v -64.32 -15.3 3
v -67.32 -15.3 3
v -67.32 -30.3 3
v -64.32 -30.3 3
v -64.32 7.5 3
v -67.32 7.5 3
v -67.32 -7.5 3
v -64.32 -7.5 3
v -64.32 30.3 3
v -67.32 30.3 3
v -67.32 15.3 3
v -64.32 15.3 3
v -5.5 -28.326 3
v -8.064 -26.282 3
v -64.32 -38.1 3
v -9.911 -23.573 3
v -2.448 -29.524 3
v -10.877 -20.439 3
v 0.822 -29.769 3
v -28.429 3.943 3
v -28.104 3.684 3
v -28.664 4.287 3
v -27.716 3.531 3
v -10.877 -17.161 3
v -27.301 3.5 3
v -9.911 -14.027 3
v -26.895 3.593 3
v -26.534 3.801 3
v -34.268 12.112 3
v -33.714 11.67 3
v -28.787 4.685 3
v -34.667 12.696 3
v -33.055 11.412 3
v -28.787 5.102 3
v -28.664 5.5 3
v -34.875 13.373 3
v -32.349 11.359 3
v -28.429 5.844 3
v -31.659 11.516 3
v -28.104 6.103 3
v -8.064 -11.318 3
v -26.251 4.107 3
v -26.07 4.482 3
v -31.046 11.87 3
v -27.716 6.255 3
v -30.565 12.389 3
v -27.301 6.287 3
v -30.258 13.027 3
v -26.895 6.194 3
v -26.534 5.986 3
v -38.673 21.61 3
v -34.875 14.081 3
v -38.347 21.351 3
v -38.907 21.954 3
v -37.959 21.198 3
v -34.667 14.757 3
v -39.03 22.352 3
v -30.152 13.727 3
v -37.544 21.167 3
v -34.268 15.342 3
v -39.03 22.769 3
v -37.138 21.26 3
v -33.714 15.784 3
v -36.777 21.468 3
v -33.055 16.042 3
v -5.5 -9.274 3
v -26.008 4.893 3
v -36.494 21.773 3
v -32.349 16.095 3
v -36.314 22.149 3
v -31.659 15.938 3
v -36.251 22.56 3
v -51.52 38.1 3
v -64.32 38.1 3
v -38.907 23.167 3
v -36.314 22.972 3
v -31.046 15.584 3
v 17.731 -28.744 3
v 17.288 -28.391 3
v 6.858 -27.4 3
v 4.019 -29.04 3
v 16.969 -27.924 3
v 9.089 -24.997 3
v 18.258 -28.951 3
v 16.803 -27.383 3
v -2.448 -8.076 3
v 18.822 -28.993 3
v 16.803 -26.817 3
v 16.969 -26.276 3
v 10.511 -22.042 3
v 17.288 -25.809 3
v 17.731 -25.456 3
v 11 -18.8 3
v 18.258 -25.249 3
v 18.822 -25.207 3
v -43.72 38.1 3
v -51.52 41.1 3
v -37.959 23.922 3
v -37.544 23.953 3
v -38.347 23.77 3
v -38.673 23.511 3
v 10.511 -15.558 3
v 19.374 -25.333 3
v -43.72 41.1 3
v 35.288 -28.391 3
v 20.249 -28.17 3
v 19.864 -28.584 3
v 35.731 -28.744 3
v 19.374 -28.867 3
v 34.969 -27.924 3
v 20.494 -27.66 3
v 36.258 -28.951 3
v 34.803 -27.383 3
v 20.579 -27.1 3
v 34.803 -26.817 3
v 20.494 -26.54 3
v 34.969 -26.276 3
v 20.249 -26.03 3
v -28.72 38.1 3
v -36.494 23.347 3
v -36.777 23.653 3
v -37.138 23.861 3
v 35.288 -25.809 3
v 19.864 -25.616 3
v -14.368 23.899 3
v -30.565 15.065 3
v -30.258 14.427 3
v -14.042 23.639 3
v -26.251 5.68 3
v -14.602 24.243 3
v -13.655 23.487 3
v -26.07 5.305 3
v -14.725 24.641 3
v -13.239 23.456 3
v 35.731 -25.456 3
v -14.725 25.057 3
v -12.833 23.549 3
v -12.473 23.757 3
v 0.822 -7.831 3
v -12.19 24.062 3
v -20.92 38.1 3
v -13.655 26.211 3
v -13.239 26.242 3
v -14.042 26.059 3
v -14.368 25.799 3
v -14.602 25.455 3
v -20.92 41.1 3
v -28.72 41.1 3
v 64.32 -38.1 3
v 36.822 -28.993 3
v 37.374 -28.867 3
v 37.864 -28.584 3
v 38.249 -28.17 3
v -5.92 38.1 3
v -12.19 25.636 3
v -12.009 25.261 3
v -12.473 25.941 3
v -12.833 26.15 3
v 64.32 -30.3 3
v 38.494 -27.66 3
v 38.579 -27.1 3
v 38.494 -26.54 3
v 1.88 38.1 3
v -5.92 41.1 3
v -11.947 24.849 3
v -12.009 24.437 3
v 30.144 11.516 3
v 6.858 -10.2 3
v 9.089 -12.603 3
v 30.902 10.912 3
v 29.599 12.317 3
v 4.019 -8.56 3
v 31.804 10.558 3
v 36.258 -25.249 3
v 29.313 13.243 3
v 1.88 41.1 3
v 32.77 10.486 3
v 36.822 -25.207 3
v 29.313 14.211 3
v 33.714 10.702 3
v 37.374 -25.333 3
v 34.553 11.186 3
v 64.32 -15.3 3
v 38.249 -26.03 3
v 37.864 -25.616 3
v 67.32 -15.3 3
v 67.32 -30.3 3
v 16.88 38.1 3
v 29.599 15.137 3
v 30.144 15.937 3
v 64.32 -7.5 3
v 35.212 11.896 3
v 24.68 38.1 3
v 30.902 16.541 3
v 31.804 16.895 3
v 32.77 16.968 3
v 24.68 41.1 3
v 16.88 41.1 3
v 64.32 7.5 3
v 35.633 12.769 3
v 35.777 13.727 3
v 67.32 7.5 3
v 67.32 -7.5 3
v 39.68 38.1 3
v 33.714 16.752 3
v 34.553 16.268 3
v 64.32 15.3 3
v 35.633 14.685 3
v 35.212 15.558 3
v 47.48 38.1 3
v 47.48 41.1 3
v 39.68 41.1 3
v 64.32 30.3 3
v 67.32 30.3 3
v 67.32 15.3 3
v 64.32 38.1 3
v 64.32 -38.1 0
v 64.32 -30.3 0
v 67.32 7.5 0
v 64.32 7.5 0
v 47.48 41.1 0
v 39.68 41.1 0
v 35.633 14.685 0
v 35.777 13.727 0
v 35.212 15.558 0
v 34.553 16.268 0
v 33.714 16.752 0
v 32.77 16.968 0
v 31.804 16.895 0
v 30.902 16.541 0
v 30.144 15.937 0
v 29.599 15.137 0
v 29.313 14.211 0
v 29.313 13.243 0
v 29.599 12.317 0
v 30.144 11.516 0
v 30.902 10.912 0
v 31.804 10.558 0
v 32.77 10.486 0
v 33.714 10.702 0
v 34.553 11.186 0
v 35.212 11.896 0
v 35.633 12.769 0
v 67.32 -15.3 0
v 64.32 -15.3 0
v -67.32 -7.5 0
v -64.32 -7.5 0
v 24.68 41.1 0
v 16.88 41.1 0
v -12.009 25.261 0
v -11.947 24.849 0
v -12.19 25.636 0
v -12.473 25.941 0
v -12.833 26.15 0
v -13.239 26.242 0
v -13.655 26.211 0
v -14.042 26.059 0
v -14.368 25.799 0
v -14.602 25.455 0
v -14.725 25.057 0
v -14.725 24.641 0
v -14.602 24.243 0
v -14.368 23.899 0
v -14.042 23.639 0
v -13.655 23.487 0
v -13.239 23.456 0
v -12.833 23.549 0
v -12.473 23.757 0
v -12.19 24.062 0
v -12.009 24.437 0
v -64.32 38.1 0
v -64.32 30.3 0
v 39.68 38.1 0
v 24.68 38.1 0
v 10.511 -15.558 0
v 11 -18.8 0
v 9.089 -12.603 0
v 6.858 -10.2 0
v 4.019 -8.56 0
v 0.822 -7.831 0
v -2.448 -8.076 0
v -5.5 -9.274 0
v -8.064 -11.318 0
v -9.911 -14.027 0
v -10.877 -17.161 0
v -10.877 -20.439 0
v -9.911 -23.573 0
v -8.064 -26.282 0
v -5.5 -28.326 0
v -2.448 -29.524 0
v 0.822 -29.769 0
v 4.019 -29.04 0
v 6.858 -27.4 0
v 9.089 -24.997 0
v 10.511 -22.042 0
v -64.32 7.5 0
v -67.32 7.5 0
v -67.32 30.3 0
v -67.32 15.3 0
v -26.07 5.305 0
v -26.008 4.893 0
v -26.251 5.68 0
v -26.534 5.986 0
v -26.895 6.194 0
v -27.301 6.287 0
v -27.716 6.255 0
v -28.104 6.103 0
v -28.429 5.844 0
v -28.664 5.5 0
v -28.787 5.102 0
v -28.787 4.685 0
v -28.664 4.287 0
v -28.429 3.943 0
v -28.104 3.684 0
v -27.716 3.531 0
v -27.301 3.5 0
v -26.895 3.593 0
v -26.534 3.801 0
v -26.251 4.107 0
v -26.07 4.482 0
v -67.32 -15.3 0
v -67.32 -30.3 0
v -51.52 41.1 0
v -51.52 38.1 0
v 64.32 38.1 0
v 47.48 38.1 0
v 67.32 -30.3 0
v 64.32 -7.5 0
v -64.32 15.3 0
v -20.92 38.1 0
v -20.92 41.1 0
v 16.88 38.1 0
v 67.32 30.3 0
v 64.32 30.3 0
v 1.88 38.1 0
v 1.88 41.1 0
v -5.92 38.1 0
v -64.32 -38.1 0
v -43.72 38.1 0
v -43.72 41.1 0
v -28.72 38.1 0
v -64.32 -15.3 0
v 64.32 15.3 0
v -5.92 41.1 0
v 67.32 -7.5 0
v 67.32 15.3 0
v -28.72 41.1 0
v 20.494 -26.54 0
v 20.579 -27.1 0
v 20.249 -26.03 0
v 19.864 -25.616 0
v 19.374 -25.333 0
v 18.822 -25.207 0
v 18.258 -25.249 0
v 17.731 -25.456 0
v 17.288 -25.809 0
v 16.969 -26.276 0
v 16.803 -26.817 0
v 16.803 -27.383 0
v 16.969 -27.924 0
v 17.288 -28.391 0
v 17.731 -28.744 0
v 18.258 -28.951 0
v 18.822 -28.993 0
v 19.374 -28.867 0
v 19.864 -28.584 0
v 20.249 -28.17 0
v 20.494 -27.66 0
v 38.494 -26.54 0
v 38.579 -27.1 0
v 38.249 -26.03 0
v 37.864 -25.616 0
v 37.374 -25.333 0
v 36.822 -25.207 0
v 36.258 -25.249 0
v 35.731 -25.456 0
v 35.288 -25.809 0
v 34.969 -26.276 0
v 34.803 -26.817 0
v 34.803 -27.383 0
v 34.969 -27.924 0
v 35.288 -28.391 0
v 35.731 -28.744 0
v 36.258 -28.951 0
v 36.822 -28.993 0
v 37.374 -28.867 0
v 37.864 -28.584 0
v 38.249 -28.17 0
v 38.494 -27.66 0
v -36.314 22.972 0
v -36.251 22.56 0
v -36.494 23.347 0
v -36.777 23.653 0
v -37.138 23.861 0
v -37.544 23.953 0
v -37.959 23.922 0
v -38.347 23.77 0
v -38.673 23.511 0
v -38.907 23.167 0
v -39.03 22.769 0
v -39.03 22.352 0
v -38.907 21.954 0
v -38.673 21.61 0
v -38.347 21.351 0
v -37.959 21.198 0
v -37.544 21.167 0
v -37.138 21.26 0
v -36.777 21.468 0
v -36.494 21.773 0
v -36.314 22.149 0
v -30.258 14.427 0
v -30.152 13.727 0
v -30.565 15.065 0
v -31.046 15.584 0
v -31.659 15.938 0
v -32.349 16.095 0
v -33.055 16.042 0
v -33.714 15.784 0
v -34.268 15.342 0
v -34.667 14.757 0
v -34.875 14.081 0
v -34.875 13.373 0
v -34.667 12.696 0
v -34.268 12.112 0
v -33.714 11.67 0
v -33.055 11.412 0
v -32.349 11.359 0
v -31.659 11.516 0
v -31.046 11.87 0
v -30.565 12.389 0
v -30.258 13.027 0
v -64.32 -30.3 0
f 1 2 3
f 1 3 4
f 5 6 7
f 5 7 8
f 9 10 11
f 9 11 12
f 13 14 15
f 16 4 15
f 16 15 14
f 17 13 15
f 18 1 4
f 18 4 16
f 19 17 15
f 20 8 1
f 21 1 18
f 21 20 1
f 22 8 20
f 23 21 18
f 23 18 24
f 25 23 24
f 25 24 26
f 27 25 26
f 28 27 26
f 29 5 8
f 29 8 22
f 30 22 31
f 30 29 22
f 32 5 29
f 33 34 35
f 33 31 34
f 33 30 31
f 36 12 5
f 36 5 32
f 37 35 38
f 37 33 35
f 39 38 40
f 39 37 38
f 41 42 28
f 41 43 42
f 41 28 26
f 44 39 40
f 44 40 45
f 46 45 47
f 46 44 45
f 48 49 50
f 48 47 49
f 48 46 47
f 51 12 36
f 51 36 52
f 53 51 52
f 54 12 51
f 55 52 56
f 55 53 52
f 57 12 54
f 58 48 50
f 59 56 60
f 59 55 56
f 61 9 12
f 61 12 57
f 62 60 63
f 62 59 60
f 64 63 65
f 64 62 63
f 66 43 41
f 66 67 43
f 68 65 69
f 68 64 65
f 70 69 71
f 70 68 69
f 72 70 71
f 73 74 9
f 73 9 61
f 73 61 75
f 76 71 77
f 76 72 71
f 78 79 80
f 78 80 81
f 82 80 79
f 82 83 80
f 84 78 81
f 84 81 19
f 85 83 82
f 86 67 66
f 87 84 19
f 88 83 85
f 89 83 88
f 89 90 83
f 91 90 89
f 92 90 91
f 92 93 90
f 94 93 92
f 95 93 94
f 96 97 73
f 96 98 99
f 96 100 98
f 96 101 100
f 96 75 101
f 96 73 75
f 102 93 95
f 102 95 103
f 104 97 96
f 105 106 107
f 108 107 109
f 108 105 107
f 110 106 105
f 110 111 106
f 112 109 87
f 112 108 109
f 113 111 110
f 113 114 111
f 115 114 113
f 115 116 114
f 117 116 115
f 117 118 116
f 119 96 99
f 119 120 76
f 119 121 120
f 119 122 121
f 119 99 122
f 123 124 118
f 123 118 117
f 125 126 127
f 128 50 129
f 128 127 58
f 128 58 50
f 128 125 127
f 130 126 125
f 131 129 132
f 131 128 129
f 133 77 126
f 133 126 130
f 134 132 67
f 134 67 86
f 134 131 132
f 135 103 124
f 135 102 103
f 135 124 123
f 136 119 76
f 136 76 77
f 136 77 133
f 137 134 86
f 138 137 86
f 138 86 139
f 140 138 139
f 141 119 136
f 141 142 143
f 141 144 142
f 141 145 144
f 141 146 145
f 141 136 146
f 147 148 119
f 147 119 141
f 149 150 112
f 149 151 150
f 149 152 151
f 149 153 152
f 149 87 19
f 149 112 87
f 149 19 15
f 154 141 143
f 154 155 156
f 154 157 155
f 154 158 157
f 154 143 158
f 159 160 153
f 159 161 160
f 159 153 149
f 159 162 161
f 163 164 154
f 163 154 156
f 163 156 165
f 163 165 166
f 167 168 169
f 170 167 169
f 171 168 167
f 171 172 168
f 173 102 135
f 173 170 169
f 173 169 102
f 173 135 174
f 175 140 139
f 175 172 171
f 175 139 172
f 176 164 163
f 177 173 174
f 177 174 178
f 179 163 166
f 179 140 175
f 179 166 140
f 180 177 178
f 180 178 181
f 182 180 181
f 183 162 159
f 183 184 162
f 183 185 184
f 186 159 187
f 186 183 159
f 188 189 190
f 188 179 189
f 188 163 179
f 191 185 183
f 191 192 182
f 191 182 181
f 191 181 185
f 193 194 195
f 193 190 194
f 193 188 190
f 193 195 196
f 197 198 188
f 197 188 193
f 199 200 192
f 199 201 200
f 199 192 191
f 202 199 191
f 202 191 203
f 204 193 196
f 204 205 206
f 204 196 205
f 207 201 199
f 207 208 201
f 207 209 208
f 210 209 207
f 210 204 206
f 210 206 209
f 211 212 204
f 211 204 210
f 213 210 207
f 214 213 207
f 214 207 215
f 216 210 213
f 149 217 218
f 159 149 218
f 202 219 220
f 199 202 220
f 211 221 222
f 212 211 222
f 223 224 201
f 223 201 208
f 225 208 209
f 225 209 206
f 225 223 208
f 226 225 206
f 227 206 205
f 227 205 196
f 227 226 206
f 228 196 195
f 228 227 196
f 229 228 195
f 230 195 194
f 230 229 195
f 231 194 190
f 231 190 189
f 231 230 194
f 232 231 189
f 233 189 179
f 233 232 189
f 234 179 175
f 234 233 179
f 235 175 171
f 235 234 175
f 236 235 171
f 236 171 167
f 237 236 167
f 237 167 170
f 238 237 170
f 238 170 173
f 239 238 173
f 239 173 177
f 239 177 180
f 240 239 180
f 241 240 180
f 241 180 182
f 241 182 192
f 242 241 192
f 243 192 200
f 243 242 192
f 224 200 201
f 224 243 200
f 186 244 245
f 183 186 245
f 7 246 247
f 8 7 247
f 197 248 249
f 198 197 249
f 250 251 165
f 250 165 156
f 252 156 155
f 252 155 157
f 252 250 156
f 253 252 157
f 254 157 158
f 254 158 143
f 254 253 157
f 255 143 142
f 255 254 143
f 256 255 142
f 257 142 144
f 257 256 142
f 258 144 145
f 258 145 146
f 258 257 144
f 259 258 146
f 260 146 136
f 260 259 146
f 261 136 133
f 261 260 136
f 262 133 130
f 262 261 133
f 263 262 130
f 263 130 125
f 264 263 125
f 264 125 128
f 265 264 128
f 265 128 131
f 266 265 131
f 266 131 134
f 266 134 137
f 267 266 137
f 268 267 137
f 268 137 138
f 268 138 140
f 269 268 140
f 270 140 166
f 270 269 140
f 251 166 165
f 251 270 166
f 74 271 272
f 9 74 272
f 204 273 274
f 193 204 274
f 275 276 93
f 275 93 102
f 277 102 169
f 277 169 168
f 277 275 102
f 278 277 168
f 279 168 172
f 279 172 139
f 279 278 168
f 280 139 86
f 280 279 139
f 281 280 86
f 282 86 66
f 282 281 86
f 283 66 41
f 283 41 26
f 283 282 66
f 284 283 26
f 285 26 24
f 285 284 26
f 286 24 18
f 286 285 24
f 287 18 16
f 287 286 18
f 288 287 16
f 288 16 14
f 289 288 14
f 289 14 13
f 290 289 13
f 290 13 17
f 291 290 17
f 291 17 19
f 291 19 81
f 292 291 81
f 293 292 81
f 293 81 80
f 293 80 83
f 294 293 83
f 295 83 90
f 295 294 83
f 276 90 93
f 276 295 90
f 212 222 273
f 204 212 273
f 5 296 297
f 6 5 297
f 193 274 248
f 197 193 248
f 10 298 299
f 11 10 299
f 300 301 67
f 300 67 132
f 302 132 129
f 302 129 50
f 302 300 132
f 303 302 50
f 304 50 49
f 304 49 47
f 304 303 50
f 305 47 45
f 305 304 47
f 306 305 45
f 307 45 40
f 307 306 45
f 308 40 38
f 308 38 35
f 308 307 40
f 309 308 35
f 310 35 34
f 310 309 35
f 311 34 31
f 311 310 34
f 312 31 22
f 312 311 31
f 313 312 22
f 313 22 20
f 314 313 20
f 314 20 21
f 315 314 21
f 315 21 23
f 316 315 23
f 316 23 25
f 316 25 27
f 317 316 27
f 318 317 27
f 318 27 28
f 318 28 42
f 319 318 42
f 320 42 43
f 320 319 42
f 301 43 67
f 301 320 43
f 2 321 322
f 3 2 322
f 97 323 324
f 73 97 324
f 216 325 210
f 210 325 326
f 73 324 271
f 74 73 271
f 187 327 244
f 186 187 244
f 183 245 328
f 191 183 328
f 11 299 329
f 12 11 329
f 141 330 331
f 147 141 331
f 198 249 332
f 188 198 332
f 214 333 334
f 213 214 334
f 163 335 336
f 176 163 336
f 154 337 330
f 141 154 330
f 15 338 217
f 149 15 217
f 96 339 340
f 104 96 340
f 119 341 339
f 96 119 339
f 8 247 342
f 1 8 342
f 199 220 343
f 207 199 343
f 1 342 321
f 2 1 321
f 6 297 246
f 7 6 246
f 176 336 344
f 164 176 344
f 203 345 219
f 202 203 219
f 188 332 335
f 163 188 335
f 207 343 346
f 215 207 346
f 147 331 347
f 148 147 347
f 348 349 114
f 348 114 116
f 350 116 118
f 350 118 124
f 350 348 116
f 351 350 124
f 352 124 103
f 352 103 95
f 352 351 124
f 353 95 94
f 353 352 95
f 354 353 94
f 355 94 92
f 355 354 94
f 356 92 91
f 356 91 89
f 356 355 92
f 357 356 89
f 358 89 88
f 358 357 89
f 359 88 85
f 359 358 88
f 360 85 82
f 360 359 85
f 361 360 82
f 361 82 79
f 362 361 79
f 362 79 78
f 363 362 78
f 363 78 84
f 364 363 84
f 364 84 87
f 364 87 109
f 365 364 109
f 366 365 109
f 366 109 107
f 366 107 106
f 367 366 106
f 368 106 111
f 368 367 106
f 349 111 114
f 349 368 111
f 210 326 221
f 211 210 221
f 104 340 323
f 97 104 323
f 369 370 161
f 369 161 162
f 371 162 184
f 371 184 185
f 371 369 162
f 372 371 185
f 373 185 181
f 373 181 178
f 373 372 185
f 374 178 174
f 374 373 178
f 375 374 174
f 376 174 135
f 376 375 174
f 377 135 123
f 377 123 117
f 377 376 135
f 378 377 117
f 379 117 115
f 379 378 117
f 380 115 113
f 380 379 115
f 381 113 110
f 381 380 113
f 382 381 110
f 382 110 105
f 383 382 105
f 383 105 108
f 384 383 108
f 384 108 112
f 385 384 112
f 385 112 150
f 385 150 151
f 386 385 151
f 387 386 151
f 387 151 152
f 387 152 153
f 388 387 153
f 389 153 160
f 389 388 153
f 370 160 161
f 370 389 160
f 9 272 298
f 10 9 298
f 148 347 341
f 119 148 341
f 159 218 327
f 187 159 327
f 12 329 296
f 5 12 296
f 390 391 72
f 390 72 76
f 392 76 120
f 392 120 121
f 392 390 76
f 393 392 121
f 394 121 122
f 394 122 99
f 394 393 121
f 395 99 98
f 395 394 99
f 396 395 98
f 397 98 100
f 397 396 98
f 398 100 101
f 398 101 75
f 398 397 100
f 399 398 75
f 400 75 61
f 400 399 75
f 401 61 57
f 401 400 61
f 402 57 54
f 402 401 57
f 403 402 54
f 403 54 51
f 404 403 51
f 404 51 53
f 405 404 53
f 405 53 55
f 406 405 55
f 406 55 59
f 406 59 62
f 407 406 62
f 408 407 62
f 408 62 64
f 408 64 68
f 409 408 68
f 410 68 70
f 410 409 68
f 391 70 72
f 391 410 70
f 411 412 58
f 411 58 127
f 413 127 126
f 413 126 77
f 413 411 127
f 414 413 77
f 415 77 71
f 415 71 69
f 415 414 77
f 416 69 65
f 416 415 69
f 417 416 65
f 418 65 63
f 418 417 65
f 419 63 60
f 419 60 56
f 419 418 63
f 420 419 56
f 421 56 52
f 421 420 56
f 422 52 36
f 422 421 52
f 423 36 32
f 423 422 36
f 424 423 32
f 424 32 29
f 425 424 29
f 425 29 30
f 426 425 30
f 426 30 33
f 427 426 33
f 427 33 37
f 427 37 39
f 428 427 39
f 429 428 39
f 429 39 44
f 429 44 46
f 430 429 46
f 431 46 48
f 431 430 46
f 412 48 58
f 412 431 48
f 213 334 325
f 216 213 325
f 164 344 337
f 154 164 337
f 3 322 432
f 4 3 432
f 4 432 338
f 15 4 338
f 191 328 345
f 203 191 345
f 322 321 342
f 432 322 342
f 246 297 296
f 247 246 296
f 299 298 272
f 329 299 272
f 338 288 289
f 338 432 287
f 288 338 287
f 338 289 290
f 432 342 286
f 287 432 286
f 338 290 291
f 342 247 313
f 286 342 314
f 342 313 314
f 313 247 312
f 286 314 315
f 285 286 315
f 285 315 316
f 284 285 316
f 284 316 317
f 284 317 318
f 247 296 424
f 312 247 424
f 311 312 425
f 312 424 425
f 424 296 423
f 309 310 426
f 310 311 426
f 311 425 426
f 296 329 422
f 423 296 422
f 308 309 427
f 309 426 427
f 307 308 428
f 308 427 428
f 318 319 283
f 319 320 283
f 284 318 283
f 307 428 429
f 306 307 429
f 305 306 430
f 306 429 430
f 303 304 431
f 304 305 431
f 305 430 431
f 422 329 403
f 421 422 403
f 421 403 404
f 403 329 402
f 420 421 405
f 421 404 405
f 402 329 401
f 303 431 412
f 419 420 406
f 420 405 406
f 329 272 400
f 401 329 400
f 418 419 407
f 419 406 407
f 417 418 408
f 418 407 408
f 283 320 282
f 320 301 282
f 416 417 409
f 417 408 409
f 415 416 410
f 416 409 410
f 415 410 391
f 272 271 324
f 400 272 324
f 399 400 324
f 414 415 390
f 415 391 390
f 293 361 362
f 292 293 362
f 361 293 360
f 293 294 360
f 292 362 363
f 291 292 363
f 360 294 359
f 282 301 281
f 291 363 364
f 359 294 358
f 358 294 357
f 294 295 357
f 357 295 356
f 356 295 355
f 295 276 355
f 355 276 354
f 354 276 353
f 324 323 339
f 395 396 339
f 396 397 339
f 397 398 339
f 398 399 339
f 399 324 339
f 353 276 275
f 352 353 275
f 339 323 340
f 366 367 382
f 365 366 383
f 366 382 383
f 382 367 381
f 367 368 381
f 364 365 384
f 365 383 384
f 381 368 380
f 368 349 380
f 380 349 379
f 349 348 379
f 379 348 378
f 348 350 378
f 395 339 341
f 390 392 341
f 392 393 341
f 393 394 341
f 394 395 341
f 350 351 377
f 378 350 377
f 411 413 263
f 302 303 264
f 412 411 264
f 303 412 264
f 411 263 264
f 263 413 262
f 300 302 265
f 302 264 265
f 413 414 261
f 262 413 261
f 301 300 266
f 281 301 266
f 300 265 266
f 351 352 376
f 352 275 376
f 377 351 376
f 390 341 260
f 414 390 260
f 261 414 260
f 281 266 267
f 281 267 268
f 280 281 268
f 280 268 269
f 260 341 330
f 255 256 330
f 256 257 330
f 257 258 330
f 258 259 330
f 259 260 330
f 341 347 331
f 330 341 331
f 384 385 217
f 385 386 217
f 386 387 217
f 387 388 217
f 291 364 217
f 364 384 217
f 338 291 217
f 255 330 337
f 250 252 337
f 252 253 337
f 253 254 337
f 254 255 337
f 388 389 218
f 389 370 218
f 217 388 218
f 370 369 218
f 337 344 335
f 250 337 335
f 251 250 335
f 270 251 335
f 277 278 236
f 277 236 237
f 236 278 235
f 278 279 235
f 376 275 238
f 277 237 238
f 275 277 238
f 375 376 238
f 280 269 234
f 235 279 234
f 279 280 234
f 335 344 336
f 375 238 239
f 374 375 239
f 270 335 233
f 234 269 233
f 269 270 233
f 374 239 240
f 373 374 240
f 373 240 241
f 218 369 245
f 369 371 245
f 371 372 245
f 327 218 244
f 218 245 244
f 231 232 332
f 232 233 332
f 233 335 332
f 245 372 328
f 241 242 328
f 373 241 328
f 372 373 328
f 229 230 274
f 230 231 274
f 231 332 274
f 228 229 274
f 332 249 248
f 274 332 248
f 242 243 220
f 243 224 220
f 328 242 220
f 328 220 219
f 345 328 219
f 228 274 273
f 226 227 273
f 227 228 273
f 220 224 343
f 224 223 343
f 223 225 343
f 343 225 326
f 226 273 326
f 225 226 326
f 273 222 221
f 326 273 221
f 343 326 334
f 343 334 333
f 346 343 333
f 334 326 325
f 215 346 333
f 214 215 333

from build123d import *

# Parameters (mm, degrees)
MODEL_R             = 1.397
MODEL_R_2           = 1.89865
MODEL_R_3           = 3.25
MODEL_R_4           = 2.3749
MODEL_R_5           = 11
BOSS_EXTRUDE1_DEPTH = 3


with BuildPart() as part:
    # Model → Boss-Extrude1 (new body)
    with BuildSketch(Plane.XY):
        Polygon((67.32, 30.3), (64.32, 30.3), (64.32, 38.1), (47.48, 38.1), (47.48, 41.1), (39.68, 41.1), (39.68, 38.1), (24.68, 38.1), (24.68, 41.1), (16.88, 41.1), (16.88, 38.1), (1.88, 38.1), (1.88, 41.1), (-5.92, 41.1), (-5.92, 38.1), (-20.92, 38.1), (-20.92, 41.1), (-28.72, 41.1), (-28.72, 38.1), (-43.72, 38.1), (-43.72, 41.1), (-51.52, 41.1), (-51.52, 38.1), (-64.32, 38.1), (-64.32, 30.3), (-67.32, 30.3), (-67.32, 15.3), (-64.32, 15.3), (-64.32, 7.5), (-67.32, 7.5), (-67.32, -7.5), (-64.32, -7.5), (-64.32, -15.3), (-67.32, -15.3), (-67.32, -30.3), (-64.32, -30.3), (-64.32, -38.1), (64.32, -38.1), (64.32, -30.3), (67.32, -30.3), (67.32, -15.3), (64.32, -15.3), (64.32, -7.5), (67.32, -7.5), (67.32, 7.5), (64.32, 7.5), (64.32, 15.3), (67.32, 15.3), align=None)
        with Locations((-37.648489217, 22.560364418)):
            Circle(MODEL_R, mode=Mode.SUBTRACT)
        with Locations((-27.405334652, 4.893459451)):
            Circle(MODEL_R, mode=Mode.SUBTRACT)
        with Locations((-13.343817362, 24.849143198)):
            Circle(MODEL_R, mode=Mode.SUBTRACT)
        with Locations((36.68, -27.1)):
            Circle(MODEL_R_2, mode=Mode.SUBTRACT)
        with Locations((18.68, -27.1)):
            Circle(MODEL_R_2, mode=Mode.SUBTRACT)
        with Locations((32.526911935, 13.726911935)):
            Circle(MODEL_R_3, mode=Mode.SUBTRACT)
        with Locations((-32.526911935, 13.726911935)):
            Circle(MODEL_R_4, mode=Mode.SUBTRACT)
        with Locations((0, -18.8)):
            Circle(MODEL_R_5, mode=Mode.SUBTRACT)
    extrude(amount=BOSS_EXTRUDE1_DEPTH)


solid = part.part
